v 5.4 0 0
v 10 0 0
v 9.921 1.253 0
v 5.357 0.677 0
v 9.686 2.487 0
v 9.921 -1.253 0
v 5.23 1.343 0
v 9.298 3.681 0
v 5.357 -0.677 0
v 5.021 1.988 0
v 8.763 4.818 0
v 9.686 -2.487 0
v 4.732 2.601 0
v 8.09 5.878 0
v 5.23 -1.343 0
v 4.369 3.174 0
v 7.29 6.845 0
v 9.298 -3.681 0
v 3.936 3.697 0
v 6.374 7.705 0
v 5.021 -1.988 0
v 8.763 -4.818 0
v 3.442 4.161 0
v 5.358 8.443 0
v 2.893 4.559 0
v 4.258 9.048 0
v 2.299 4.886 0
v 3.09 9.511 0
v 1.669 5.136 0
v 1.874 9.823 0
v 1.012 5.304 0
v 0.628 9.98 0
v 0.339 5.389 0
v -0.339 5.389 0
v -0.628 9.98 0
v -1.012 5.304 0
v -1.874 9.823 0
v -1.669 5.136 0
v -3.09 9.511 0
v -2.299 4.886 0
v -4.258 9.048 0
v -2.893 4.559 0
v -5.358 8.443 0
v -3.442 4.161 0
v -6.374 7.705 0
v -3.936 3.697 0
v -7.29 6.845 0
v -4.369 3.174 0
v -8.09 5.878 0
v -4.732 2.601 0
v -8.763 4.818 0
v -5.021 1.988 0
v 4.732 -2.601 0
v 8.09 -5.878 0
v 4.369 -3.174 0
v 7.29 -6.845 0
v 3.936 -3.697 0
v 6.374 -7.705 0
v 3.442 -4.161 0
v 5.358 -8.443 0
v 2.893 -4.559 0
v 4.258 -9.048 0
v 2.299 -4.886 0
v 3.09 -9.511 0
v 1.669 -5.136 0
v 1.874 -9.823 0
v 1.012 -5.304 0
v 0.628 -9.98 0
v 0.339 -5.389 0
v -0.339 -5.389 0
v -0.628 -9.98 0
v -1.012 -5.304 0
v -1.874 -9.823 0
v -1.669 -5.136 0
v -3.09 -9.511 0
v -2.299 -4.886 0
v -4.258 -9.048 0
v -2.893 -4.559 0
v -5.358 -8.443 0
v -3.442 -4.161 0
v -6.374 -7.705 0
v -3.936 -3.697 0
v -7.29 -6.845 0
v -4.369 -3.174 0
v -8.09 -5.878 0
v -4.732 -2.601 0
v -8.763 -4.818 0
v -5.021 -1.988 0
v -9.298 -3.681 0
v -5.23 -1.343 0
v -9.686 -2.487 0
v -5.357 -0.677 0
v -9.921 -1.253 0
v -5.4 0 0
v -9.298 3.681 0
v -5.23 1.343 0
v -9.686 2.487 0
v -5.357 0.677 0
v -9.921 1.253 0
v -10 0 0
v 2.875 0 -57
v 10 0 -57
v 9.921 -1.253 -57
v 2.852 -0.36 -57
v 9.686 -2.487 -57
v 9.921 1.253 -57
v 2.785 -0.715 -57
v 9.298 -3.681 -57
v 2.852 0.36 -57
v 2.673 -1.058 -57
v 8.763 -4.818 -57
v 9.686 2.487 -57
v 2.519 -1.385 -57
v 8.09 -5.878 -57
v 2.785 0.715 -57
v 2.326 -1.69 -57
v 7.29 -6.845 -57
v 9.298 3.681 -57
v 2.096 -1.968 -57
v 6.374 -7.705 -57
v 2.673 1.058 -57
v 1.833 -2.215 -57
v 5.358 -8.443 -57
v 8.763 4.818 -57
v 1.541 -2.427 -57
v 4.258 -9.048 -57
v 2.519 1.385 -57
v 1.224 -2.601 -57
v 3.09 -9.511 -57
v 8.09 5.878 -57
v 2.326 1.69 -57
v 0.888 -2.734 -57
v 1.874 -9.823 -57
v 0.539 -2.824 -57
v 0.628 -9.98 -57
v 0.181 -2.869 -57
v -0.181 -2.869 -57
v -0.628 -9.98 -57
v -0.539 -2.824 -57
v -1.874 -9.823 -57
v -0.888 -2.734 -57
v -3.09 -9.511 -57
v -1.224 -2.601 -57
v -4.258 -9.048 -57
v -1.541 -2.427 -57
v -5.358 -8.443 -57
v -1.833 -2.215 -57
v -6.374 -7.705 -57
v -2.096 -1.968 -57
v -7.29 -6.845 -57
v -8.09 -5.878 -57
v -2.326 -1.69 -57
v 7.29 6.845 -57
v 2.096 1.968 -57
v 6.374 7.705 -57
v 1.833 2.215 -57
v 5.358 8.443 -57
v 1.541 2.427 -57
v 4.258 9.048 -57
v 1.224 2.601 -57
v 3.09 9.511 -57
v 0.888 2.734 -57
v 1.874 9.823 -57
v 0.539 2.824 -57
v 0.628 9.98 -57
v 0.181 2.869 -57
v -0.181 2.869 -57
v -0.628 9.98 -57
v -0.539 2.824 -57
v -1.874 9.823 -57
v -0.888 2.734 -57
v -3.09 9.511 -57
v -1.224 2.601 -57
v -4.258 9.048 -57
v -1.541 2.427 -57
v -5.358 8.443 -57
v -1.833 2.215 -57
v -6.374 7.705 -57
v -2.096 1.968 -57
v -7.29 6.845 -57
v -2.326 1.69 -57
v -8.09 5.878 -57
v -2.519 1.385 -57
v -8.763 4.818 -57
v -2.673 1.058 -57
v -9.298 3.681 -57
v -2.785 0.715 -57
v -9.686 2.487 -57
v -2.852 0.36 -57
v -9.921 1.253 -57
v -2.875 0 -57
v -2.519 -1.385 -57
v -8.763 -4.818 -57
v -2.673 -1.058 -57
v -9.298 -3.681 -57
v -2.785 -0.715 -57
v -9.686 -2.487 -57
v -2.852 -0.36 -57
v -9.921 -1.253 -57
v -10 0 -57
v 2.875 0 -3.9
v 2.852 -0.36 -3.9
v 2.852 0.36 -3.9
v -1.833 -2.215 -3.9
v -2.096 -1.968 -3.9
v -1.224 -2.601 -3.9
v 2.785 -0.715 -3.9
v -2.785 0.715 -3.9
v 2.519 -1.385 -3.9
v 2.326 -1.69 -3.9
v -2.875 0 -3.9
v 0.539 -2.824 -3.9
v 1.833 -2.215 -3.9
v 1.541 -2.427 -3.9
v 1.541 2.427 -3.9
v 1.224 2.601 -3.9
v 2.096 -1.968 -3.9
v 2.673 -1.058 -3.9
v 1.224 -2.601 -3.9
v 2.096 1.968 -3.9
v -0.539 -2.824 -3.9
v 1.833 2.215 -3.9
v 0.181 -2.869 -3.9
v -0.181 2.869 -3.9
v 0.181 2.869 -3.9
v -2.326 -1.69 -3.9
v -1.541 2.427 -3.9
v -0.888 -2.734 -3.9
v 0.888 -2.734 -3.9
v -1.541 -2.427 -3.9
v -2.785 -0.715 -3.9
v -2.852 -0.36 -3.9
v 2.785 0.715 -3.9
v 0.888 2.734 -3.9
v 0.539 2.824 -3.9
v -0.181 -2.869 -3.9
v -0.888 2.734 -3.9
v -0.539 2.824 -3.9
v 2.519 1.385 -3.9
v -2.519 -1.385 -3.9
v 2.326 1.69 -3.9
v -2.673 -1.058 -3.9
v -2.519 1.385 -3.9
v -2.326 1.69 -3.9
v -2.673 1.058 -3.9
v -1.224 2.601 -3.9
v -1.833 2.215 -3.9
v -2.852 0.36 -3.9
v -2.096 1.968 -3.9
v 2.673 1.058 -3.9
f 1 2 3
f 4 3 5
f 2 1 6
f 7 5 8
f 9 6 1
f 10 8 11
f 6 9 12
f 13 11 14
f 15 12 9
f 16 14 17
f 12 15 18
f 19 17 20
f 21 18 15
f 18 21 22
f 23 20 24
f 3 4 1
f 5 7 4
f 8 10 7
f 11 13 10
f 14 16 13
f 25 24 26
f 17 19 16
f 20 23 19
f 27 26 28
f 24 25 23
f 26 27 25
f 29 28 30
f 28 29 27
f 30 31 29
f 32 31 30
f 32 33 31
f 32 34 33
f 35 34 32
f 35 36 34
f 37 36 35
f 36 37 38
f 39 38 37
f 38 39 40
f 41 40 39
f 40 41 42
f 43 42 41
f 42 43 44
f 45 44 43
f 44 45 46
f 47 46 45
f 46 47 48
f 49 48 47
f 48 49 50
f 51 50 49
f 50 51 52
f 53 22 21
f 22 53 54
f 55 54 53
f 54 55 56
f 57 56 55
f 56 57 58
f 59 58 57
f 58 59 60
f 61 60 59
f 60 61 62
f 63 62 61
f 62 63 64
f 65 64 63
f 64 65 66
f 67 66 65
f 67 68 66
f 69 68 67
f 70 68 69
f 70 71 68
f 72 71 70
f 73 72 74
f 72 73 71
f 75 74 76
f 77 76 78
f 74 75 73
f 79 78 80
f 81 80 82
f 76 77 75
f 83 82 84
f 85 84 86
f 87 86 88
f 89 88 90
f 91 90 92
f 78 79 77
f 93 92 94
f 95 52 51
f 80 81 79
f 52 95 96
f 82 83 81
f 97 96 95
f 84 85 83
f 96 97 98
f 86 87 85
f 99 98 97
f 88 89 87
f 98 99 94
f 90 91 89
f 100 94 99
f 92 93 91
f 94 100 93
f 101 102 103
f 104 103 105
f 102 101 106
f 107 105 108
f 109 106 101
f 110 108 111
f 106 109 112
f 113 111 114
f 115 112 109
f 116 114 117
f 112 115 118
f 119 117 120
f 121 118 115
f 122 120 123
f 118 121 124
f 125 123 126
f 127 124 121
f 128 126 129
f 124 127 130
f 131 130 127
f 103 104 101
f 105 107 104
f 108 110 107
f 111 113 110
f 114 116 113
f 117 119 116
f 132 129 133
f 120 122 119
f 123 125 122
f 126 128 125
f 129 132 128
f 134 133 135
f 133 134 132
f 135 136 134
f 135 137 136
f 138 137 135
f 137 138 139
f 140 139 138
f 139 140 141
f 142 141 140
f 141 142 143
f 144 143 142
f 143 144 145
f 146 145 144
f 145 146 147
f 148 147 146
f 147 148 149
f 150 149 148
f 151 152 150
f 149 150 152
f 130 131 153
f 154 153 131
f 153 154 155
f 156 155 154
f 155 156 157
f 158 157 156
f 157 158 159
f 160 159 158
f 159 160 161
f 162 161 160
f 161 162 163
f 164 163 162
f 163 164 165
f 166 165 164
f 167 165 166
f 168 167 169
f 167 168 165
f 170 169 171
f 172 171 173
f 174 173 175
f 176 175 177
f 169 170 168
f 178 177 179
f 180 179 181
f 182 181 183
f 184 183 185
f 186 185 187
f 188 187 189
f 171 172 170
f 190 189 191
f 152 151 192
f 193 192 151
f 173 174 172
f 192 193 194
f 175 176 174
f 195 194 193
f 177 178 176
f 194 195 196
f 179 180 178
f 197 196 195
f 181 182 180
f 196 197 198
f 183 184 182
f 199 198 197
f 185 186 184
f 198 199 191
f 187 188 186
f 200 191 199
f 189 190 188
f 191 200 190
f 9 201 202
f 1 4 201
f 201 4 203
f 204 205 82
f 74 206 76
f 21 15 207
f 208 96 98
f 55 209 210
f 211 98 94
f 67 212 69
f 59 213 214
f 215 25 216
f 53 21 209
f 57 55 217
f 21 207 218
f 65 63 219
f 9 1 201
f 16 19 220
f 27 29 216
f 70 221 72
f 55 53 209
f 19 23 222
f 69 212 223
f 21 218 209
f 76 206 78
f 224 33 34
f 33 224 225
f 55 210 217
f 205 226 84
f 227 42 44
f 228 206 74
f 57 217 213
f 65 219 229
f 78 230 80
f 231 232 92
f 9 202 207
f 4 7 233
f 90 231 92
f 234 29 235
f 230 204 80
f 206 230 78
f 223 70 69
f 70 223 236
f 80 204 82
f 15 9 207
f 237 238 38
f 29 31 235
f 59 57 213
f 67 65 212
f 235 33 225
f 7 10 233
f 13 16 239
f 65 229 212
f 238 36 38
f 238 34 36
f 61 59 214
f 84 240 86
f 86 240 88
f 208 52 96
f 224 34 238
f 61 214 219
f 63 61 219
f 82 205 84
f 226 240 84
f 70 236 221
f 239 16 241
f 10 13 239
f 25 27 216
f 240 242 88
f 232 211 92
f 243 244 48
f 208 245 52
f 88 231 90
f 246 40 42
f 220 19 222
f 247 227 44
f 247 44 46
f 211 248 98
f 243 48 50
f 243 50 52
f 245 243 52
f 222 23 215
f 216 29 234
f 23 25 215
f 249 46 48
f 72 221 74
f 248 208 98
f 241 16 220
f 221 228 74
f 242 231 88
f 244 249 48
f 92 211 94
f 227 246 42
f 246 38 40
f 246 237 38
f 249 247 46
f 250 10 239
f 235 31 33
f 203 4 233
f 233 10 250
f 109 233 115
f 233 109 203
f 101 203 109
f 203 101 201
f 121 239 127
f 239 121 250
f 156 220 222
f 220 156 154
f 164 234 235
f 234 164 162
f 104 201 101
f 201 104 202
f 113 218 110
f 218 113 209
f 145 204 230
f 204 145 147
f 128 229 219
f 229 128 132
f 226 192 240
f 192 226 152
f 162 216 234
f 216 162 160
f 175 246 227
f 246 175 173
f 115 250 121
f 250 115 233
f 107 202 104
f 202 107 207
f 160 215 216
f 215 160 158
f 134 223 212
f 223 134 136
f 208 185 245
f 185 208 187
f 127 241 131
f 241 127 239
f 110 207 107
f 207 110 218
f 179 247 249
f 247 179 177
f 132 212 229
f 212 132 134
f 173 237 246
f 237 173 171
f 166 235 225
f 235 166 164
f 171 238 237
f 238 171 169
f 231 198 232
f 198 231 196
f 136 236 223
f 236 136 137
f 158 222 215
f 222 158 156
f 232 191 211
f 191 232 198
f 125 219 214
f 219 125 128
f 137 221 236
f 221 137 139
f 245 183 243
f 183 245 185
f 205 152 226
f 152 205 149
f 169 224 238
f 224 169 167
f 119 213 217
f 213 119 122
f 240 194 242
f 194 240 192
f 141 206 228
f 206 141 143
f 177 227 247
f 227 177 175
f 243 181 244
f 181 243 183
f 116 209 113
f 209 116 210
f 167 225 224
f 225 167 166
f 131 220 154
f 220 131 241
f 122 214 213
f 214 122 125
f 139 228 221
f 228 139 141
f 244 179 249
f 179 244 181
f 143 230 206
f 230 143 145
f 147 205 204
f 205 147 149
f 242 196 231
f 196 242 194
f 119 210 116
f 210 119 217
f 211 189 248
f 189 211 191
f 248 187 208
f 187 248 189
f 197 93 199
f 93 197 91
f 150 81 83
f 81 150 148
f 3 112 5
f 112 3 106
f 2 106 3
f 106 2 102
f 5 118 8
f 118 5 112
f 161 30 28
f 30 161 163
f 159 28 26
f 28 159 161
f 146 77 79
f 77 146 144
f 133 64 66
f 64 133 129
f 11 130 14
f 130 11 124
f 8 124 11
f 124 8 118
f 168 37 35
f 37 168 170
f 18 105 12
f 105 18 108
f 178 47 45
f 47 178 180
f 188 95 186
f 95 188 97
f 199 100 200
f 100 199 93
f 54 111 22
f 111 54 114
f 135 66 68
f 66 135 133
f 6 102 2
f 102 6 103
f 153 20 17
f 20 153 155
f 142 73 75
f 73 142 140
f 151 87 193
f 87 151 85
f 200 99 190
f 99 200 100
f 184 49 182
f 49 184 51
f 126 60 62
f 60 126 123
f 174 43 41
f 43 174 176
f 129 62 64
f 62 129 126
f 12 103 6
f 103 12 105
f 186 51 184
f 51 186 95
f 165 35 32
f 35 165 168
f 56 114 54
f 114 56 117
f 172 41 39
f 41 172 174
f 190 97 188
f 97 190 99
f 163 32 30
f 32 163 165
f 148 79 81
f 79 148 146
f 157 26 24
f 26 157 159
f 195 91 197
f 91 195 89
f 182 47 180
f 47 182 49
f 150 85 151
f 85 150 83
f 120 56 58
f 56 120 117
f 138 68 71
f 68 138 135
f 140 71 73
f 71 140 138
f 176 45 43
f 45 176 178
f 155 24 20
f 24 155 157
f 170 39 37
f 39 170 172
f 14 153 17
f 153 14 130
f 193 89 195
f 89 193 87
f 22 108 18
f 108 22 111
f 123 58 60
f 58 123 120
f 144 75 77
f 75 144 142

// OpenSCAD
$fn = 50;


difference() {
	union() {
		translate(v = [0, 0, -57.0000000000]) {
			cylinder(h = 57, r = 10.0000000000);
		}
		cylinder(h = 0, r = 16.0000000000);
	}
	union() {
		translate(v = [0, 0, 0]) {
			rotate(a = [0, 0, 0]) {
				difference() {
					union() {
						#translate(v = [0, 0, -57.0000000000]) {
							cylinder(h = 57, r = 2.6000000000);
						}
						#translate(v = [0, 0, -3.9000000000]) {
							cylinder(h = 3.9000000000, r1 = 2.8750000000, r2 = 5.4000000000);
						}
						#translate(v = [0, 0, -57.0000000000]) {
							cylinder(h = 57, r = 2.8750000000);
						}
						#translate(v = [0, 0, -57.0000000000]) {
							cylinder(h = 57, r = 2.6000000000);
						}
					}
					union();
				}
			}
		}
	}
}
